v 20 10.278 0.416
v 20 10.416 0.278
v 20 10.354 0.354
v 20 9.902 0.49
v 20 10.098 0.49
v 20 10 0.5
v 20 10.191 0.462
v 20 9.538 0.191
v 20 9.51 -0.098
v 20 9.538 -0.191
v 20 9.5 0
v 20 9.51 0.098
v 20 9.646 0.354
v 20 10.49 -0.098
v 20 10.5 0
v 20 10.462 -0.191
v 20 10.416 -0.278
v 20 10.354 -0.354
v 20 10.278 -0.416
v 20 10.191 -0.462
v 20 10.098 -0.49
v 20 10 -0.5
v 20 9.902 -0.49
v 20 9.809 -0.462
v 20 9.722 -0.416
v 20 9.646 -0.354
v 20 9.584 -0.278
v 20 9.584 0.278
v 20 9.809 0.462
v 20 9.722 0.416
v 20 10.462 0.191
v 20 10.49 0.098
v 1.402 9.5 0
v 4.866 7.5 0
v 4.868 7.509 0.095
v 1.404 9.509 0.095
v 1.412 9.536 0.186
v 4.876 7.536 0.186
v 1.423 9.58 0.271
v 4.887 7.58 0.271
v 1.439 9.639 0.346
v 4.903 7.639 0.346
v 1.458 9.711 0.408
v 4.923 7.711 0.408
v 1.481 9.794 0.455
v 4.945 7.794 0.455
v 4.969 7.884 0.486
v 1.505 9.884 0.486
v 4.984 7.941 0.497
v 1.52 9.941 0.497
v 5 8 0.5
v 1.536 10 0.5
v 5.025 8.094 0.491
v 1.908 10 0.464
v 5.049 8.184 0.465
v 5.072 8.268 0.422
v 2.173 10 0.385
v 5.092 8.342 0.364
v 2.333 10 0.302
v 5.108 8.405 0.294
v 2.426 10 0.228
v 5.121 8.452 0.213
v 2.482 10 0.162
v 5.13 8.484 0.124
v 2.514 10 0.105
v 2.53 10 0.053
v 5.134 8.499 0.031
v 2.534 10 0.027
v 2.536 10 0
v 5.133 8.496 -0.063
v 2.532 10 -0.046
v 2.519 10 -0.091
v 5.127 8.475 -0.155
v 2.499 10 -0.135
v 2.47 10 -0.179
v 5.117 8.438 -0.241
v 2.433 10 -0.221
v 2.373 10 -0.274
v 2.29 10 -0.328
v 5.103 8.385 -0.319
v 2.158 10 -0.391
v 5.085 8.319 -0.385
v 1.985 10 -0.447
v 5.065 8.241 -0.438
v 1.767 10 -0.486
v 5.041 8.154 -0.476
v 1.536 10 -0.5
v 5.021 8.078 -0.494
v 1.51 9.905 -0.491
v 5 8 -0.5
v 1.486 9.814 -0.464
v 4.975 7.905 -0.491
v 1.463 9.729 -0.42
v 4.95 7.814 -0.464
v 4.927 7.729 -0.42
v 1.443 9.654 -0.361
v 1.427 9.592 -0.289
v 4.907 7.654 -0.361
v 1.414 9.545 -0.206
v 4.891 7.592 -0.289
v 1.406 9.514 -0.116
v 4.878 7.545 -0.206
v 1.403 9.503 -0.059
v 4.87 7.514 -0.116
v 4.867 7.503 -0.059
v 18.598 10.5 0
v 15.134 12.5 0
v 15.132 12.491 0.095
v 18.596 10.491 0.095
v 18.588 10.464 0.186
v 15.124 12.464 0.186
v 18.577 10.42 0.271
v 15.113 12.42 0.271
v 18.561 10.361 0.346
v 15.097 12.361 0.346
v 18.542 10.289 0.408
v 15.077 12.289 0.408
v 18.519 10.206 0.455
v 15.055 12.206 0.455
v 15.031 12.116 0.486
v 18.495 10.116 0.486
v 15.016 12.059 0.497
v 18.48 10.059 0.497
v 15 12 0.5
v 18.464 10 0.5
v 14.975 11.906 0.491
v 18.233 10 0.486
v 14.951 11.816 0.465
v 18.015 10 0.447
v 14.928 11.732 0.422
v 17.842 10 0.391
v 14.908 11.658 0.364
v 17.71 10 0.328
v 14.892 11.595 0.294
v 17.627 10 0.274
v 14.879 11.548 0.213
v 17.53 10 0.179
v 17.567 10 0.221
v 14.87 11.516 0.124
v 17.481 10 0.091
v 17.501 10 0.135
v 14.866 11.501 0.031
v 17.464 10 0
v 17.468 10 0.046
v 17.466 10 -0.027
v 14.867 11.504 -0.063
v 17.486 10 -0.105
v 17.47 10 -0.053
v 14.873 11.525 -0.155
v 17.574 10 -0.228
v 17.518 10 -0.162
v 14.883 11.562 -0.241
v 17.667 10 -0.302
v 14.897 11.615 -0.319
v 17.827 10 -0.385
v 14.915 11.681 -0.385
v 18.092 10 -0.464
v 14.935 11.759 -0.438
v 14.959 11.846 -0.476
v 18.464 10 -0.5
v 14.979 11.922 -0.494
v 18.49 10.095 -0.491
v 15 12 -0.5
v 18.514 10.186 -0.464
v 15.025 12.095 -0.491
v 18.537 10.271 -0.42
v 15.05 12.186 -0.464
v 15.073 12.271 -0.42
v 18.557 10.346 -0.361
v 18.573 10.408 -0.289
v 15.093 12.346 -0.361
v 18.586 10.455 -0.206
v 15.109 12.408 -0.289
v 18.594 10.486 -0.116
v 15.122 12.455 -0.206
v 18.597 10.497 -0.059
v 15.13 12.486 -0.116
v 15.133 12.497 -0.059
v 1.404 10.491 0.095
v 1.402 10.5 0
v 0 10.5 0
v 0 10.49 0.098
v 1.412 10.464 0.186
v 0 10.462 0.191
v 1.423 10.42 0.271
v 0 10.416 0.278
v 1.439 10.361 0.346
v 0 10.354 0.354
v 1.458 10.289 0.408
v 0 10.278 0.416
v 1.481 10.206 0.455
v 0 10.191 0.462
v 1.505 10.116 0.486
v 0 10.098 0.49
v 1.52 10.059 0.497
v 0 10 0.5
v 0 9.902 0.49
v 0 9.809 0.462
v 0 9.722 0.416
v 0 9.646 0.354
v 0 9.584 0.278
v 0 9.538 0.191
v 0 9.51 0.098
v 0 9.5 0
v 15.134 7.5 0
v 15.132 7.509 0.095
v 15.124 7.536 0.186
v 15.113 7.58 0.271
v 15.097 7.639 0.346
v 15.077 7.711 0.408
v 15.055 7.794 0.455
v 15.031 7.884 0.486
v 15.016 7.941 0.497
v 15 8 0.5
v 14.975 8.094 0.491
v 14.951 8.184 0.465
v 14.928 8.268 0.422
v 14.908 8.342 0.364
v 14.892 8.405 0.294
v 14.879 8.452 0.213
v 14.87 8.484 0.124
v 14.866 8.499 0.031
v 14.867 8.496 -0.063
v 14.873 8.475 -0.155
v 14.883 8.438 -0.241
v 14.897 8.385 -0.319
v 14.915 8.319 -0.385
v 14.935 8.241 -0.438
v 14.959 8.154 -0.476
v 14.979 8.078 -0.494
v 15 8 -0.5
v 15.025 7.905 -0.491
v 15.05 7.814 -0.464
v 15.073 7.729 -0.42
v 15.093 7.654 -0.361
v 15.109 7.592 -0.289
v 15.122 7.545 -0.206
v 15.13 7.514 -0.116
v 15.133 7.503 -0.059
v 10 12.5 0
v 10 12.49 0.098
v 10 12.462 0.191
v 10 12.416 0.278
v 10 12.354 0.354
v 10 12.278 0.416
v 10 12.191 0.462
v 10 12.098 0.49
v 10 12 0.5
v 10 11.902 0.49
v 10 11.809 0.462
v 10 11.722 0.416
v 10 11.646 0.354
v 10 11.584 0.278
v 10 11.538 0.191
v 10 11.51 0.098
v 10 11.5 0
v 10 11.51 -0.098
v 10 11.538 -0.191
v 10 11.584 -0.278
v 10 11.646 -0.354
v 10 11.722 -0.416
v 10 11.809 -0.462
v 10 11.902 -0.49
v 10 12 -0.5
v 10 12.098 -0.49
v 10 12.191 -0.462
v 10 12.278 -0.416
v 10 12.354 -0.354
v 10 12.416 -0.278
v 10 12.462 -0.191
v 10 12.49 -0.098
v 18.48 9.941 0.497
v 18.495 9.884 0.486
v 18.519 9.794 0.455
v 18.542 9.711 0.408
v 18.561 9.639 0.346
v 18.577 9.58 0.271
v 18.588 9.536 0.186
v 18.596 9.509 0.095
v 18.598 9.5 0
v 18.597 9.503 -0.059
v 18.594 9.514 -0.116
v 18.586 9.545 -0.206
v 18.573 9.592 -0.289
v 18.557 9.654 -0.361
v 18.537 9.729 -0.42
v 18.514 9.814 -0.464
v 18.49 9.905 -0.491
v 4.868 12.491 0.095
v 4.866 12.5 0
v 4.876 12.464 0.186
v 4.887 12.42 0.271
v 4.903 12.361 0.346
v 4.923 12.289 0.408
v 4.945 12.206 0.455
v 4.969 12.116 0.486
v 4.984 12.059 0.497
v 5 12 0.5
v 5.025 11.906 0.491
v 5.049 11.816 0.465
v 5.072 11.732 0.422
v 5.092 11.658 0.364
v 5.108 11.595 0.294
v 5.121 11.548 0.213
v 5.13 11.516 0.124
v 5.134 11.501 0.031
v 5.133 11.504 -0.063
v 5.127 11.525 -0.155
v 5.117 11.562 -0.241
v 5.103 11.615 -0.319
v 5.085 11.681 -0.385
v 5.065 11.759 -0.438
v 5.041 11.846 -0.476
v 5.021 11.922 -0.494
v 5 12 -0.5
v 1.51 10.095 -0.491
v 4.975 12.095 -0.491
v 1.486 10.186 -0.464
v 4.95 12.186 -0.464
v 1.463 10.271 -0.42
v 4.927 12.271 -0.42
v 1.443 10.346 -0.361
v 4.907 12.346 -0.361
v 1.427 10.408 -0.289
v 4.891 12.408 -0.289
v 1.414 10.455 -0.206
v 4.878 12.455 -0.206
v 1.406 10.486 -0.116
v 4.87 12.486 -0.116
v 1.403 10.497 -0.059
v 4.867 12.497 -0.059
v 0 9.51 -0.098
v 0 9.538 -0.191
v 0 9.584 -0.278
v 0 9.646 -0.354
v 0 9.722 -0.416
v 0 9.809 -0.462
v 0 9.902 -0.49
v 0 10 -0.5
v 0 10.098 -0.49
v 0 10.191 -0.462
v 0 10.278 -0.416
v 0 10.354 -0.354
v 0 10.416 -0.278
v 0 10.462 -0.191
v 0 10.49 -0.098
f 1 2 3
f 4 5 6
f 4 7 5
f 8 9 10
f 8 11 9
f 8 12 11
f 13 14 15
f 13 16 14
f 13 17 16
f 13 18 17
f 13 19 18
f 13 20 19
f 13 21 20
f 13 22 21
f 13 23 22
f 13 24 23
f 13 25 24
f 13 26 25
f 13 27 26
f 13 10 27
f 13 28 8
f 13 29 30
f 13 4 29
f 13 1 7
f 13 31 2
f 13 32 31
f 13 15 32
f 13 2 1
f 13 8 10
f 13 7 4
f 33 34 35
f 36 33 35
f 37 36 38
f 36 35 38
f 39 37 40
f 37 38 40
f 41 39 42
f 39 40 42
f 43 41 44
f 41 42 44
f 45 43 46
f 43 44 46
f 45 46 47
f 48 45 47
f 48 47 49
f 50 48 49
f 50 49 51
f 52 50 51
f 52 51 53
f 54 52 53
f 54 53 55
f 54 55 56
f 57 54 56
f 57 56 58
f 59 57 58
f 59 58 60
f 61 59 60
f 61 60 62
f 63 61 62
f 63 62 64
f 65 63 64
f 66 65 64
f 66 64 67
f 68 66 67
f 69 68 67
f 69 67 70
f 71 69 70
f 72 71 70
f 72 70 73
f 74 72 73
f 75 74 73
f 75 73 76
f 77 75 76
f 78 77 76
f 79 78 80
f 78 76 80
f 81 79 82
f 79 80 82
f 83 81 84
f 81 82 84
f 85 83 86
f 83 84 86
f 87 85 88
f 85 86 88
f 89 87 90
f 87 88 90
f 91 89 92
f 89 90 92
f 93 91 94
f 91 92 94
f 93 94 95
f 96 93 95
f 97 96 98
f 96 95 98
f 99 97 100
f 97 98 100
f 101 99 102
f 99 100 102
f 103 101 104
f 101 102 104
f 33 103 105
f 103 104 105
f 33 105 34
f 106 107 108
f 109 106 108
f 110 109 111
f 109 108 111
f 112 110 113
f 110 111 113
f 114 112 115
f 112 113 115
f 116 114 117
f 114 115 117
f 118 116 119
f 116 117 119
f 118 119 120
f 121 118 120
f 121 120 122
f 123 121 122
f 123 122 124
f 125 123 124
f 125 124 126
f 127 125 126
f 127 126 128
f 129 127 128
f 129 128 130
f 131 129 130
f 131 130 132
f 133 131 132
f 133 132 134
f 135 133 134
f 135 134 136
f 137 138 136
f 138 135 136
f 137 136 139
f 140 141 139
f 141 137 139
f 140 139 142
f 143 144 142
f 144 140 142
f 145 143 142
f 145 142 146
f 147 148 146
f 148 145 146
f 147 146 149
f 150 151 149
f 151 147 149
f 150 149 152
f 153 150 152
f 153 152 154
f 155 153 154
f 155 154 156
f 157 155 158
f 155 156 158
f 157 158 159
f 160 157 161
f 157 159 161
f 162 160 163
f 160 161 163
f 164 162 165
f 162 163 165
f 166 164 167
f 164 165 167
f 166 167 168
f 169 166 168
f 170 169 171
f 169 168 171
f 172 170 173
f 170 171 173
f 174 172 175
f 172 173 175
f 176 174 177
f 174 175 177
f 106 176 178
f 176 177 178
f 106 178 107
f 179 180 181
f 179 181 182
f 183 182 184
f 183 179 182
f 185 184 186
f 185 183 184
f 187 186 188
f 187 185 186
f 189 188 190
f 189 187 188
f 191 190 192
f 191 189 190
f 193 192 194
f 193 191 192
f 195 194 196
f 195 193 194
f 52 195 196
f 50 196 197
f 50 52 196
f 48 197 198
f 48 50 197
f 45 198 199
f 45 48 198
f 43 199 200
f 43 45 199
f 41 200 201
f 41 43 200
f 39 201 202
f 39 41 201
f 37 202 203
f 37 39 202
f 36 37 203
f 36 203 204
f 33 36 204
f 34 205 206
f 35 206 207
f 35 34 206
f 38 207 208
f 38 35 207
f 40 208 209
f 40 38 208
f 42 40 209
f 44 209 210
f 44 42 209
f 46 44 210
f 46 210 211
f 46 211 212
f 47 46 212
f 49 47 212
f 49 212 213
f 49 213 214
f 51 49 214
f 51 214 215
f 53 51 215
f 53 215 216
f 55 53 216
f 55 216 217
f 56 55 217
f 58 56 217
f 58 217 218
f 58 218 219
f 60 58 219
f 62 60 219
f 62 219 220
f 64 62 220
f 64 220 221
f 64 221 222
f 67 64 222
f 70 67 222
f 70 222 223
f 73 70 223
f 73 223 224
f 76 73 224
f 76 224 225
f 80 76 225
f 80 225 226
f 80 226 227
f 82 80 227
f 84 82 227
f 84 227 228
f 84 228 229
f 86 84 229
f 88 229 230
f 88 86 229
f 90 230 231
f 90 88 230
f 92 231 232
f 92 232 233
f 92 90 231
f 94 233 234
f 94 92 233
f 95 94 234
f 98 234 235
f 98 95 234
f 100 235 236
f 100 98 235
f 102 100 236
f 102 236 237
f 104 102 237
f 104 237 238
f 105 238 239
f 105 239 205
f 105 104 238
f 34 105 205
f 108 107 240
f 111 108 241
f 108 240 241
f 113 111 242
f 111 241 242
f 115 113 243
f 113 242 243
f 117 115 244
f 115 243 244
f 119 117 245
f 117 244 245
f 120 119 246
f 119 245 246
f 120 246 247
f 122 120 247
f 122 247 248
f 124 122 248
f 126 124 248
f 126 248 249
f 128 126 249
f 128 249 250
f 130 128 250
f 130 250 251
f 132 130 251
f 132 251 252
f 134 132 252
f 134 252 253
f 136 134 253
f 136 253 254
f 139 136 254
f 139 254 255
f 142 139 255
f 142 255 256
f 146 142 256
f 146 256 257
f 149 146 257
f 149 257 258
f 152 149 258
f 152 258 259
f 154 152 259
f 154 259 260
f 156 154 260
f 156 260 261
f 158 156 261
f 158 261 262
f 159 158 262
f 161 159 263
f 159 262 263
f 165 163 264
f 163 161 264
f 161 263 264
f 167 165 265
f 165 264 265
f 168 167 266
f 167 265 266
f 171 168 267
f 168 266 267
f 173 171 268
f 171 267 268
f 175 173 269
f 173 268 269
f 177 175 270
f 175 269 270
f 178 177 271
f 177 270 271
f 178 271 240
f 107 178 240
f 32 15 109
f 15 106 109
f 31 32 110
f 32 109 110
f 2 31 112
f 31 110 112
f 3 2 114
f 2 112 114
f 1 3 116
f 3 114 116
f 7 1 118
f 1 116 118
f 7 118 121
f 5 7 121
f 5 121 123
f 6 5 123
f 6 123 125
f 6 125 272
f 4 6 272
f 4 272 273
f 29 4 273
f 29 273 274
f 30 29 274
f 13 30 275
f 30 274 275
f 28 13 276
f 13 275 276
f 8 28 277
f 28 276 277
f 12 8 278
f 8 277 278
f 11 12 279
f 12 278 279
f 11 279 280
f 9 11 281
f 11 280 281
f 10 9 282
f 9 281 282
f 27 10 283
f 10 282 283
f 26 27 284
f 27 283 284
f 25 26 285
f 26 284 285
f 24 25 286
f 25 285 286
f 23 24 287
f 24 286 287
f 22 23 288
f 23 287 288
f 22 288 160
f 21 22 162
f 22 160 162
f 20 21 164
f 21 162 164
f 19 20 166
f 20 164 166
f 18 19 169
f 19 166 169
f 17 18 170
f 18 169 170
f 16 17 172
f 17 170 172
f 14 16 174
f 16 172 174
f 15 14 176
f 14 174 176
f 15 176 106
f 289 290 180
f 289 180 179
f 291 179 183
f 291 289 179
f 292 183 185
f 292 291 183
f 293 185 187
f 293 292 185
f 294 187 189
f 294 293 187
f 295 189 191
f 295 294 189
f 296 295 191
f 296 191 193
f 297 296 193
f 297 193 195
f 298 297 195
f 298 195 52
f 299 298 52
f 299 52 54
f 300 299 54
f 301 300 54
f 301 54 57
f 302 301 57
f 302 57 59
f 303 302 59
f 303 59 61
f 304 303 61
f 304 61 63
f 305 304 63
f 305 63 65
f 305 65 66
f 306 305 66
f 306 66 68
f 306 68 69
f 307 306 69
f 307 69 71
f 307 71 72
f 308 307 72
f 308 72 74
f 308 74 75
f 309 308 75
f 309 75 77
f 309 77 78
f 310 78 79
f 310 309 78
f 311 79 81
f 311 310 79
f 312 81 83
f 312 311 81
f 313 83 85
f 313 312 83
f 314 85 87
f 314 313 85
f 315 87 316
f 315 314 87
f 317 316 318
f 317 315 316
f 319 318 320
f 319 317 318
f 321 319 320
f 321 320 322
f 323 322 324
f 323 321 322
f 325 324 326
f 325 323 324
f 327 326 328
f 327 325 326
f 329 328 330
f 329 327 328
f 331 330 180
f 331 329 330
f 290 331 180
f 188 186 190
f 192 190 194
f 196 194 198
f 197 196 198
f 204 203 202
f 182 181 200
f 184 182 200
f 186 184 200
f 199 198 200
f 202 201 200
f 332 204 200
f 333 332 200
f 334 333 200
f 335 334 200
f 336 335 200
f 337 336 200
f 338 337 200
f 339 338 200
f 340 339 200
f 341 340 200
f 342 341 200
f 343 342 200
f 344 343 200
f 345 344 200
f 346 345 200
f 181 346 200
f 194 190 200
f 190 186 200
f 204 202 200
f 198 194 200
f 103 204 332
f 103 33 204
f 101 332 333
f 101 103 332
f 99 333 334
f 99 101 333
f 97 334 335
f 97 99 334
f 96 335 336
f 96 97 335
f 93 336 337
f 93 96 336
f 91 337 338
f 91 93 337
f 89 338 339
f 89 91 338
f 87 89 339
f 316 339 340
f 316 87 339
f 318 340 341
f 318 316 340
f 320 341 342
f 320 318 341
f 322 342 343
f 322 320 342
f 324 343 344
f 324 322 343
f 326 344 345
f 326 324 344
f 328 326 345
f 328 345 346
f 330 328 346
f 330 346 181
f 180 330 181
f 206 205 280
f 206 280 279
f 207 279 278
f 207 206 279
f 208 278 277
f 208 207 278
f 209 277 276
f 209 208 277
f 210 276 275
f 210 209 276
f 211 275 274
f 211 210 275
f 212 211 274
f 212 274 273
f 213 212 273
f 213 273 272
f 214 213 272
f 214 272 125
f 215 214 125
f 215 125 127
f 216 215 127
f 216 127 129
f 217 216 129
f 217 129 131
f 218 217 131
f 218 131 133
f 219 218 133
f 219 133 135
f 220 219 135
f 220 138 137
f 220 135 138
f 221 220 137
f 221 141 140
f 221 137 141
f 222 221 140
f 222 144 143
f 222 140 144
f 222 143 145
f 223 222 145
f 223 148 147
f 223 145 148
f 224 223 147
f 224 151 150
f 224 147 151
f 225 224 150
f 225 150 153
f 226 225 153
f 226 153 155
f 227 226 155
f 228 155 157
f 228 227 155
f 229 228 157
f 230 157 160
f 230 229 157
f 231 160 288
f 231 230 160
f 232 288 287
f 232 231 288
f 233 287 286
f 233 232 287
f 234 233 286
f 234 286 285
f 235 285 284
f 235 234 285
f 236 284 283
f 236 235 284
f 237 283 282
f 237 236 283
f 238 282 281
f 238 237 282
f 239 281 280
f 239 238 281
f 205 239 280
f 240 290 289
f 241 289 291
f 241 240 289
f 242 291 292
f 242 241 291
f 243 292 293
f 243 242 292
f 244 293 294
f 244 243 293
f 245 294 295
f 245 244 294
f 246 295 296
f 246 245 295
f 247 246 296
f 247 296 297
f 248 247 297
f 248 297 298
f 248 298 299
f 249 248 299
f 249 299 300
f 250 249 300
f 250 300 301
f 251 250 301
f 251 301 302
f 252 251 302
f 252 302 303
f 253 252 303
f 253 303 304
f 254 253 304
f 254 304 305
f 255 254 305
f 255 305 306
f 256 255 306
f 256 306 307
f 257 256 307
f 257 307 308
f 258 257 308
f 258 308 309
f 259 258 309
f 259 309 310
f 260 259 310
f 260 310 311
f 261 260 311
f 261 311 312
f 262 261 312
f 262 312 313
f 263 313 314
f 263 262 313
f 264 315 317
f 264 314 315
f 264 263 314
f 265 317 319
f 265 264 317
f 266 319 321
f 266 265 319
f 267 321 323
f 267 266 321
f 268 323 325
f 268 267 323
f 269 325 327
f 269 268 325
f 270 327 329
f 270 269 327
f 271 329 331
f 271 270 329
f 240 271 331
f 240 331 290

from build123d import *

# Parameters (mm, degrees)
F1_R = 0.5


with BuildPart() as f2:
    # F2: sweep along a path in F0
    with BuildLine(Plane.XY) as f2_path:
        Line((0, 10), (1.5358983849, 10))
        Line((1.5358983849, 10), (5, 12))
        Line((5, 12), (10, 12))
    # F1 (on Right) → F2 (sweep)
    with BuildSketch(Plane.YZ):
        with Locations((10, 0)):
            Circle(F1_R)
    sweep(path=f2_path.line, transition=Transition.RIGHT)

    # F7: F2 across plane


with BuildPart() as f2_1:
    add(f2.part)
    add(f2.part.mirror(Plane.YZ.offset(10)))

    # F8: F2 across plane


with BuildPart() as f2_2:
    add(f2_1.part)
    add(f2_1.part.mirror(Plane.XZ.offset(-10)))


solid = f2_2.part
